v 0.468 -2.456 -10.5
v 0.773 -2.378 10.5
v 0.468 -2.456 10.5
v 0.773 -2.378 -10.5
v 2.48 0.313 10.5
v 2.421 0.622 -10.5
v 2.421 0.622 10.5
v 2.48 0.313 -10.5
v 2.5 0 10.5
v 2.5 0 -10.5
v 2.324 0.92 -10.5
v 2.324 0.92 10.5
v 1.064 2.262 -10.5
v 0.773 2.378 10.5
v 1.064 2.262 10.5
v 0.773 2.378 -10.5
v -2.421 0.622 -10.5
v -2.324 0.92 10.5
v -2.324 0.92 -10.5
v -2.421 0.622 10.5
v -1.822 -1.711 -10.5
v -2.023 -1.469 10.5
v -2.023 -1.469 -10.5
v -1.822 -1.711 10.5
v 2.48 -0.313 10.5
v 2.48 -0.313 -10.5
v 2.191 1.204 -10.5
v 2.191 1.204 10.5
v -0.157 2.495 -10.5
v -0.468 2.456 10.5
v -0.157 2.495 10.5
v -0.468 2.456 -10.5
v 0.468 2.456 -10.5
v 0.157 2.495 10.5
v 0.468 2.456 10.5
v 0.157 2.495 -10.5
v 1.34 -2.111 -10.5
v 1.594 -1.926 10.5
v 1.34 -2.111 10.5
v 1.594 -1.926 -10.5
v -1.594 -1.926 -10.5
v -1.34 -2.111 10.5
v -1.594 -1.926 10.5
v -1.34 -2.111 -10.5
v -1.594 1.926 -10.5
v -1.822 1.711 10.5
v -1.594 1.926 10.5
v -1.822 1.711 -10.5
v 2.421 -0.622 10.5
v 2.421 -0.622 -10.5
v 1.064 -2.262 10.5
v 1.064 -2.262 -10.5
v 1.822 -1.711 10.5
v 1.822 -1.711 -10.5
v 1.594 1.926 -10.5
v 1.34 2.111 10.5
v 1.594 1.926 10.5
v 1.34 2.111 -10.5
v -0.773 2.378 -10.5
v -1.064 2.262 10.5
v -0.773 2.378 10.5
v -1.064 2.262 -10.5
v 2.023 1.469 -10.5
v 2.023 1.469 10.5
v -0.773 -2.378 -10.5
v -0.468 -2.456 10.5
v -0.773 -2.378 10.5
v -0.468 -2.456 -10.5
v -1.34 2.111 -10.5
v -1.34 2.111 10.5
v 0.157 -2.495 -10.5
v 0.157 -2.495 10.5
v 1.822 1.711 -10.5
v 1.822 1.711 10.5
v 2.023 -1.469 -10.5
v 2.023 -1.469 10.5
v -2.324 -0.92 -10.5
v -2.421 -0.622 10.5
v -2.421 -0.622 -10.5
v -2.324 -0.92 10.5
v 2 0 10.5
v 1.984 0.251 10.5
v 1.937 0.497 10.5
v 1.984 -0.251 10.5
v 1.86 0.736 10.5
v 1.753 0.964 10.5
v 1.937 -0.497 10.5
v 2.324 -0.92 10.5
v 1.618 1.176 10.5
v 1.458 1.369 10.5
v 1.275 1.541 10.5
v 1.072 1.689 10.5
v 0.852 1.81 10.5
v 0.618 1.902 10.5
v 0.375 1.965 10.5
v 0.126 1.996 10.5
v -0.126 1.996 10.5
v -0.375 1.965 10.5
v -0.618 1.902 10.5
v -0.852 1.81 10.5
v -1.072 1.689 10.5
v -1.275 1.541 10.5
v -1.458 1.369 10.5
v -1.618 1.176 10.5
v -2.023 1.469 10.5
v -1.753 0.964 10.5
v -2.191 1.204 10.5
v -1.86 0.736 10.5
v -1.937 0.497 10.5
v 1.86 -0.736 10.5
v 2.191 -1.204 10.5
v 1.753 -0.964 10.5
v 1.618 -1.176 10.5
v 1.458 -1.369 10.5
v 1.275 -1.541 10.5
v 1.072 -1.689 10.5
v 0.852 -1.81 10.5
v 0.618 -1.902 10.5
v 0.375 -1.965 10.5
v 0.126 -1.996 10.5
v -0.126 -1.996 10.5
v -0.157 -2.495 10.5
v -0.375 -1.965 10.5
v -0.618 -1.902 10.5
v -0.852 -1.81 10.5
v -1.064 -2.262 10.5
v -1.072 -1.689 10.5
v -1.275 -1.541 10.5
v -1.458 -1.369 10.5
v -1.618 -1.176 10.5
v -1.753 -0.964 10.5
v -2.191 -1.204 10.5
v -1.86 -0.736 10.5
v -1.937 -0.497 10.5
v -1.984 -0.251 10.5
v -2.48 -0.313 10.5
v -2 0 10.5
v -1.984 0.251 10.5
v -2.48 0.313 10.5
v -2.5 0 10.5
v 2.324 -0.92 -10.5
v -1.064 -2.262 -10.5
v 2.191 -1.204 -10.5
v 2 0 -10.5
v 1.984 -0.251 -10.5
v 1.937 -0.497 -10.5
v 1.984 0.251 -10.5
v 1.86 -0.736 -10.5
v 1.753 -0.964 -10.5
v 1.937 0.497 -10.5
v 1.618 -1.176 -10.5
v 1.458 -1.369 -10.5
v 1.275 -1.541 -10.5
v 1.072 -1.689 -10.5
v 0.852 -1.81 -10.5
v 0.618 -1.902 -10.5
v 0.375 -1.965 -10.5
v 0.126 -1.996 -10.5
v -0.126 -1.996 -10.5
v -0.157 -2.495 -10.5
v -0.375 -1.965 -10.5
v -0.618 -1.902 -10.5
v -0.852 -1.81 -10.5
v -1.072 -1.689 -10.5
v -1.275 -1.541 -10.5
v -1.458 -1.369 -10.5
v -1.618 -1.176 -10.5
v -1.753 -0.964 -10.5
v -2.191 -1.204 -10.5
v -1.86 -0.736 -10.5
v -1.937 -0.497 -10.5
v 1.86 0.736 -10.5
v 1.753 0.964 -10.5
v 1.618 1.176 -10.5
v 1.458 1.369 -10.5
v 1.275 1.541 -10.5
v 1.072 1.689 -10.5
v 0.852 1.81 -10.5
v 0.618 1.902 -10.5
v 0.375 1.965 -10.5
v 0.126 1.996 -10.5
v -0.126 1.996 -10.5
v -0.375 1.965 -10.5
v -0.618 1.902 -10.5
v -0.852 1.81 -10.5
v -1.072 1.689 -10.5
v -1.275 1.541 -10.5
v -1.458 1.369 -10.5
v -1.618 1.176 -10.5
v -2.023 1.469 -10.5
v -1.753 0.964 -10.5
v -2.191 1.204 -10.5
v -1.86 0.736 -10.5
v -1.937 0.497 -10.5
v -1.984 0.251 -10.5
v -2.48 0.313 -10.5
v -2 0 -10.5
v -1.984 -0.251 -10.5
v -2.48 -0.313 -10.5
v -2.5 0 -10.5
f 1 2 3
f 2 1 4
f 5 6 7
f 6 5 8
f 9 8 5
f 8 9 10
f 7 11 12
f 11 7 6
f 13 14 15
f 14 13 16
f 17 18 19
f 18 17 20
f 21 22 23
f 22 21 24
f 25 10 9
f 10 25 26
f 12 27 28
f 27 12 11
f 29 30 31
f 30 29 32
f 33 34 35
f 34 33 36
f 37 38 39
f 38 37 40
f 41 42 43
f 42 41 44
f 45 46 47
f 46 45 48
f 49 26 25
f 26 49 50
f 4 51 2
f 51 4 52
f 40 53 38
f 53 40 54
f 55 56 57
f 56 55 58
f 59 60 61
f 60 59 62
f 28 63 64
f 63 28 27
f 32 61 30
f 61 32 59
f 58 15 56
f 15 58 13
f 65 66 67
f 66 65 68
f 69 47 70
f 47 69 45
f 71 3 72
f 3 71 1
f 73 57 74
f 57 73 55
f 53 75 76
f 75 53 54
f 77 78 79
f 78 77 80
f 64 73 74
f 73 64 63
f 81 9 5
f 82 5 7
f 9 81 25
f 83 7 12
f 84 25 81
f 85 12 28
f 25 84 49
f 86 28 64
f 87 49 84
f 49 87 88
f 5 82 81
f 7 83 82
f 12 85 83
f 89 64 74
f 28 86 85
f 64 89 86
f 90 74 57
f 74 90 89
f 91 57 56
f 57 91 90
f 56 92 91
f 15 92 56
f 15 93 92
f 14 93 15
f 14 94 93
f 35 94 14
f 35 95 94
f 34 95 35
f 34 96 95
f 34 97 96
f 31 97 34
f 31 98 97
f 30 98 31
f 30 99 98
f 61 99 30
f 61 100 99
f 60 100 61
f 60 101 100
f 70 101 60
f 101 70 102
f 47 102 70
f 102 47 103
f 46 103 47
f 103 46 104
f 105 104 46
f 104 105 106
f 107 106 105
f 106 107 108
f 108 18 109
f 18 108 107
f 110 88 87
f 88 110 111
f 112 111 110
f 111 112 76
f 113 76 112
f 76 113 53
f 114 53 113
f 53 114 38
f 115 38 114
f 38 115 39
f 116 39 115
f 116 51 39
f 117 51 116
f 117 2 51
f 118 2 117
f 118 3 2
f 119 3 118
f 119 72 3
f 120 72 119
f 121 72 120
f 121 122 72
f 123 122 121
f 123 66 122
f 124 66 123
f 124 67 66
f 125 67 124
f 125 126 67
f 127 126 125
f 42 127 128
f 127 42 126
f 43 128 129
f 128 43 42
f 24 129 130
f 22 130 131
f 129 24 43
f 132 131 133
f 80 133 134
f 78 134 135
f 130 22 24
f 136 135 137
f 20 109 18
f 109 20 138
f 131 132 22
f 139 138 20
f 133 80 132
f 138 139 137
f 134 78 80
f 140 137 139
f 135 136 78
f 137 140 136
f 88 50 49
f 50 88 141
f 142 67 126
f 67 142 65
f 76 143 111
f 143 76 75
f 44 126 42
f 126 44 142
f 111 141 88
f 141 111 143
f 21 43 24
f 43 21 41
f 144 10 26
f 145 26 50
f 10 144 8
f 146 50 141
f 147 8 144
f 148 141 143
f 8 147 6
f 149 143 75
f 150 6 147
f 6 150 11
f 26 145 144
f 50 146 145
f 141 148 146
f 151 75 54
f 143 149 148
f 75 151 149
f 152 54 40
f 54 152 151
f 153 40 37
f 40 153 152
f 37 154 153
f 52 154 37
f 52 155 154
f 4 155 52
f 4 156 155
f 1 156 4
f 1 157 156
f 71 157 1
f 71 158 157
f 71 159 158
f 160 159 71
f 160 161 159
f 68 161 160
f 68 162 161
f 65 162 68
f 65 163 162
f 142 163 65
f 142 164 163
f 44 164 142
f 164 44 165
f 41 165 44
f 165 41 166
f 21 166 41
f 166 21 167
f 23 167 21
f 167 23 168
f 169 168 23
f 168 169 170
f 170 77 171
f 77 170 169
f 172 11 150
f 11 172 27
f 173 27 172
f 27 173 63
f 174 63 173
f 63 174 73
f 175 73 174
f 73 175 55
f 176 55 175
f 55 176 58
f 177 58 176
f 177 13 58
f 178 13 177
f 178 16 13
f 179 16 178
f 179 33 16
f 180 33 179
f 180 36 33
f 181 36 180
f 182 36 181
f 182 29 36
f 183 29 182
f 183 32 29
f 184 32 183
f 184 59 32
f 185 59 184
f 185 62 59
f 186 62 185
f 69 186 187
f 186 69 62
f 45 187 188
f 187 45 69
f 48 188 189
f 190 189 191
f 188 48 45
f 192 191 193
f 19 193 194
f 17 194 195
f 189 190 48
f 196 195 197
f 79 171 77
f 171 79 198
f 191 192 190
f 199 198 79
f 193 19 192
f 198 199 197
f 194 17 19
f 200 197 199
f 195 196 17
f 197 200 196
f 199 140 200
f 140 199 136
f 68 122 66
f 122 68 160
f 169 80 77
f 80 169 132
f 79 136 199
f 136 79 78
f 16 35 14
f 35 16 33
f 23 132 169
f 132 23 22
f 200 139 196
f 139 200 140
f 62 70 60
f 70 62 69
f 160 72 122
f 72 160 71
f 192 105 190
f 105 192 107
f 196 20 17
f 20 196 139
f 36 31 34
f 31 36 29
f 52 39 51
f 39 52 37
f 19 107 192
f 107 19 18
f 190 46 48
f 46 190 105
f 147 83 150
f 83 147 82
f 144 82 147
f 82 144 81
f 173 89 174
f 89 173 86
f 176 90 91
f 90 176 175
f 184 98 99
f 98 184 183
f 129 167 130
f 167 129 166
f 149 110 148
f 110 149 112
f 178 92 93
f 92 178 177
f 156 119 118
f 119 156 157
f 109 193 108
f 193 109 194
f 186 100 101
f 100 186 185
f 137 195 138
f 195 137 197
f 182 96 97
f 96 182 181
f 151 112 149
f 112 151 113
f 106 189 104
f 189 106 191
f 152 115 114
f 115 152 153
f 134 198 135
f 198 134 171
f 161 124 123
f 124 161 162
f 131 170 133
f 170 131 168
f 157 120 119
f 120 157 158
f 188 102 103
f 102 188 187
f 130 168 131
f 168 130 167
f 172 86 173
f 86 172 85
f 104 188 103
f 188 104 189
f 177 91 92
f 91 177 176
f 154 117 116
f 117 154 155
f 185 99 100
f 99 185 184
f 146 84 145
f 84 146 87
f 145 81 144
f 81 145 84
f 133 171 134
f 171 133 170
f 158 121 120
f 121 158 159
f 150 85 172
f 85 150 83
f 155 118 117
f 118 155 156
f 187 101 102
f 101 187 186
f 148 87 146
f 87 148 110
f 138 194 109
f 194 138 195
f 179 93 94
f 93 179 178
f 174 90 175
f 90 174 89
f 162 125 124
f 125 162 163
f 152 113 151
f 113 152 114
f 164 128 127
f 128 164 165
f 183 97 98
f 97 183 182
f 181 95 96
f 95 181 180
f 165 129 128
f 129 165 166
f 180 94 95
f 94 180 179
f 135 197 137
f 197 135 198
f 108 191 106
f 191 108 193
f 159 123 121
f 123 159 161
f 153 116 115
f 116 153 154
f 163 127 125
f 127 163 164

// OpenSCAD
$fn = 50;


difference() {
	union() {
		translate(v = [0, 0, -10.5000000000]) {
			cylinder(h = 21, r = 2.5000000000);
		}
	}
	union() {
		translate(v = [0, 0, -100.0000000000]) {
			cylinder(h = 200, r = 2.0000000000);
		}
	}
}
